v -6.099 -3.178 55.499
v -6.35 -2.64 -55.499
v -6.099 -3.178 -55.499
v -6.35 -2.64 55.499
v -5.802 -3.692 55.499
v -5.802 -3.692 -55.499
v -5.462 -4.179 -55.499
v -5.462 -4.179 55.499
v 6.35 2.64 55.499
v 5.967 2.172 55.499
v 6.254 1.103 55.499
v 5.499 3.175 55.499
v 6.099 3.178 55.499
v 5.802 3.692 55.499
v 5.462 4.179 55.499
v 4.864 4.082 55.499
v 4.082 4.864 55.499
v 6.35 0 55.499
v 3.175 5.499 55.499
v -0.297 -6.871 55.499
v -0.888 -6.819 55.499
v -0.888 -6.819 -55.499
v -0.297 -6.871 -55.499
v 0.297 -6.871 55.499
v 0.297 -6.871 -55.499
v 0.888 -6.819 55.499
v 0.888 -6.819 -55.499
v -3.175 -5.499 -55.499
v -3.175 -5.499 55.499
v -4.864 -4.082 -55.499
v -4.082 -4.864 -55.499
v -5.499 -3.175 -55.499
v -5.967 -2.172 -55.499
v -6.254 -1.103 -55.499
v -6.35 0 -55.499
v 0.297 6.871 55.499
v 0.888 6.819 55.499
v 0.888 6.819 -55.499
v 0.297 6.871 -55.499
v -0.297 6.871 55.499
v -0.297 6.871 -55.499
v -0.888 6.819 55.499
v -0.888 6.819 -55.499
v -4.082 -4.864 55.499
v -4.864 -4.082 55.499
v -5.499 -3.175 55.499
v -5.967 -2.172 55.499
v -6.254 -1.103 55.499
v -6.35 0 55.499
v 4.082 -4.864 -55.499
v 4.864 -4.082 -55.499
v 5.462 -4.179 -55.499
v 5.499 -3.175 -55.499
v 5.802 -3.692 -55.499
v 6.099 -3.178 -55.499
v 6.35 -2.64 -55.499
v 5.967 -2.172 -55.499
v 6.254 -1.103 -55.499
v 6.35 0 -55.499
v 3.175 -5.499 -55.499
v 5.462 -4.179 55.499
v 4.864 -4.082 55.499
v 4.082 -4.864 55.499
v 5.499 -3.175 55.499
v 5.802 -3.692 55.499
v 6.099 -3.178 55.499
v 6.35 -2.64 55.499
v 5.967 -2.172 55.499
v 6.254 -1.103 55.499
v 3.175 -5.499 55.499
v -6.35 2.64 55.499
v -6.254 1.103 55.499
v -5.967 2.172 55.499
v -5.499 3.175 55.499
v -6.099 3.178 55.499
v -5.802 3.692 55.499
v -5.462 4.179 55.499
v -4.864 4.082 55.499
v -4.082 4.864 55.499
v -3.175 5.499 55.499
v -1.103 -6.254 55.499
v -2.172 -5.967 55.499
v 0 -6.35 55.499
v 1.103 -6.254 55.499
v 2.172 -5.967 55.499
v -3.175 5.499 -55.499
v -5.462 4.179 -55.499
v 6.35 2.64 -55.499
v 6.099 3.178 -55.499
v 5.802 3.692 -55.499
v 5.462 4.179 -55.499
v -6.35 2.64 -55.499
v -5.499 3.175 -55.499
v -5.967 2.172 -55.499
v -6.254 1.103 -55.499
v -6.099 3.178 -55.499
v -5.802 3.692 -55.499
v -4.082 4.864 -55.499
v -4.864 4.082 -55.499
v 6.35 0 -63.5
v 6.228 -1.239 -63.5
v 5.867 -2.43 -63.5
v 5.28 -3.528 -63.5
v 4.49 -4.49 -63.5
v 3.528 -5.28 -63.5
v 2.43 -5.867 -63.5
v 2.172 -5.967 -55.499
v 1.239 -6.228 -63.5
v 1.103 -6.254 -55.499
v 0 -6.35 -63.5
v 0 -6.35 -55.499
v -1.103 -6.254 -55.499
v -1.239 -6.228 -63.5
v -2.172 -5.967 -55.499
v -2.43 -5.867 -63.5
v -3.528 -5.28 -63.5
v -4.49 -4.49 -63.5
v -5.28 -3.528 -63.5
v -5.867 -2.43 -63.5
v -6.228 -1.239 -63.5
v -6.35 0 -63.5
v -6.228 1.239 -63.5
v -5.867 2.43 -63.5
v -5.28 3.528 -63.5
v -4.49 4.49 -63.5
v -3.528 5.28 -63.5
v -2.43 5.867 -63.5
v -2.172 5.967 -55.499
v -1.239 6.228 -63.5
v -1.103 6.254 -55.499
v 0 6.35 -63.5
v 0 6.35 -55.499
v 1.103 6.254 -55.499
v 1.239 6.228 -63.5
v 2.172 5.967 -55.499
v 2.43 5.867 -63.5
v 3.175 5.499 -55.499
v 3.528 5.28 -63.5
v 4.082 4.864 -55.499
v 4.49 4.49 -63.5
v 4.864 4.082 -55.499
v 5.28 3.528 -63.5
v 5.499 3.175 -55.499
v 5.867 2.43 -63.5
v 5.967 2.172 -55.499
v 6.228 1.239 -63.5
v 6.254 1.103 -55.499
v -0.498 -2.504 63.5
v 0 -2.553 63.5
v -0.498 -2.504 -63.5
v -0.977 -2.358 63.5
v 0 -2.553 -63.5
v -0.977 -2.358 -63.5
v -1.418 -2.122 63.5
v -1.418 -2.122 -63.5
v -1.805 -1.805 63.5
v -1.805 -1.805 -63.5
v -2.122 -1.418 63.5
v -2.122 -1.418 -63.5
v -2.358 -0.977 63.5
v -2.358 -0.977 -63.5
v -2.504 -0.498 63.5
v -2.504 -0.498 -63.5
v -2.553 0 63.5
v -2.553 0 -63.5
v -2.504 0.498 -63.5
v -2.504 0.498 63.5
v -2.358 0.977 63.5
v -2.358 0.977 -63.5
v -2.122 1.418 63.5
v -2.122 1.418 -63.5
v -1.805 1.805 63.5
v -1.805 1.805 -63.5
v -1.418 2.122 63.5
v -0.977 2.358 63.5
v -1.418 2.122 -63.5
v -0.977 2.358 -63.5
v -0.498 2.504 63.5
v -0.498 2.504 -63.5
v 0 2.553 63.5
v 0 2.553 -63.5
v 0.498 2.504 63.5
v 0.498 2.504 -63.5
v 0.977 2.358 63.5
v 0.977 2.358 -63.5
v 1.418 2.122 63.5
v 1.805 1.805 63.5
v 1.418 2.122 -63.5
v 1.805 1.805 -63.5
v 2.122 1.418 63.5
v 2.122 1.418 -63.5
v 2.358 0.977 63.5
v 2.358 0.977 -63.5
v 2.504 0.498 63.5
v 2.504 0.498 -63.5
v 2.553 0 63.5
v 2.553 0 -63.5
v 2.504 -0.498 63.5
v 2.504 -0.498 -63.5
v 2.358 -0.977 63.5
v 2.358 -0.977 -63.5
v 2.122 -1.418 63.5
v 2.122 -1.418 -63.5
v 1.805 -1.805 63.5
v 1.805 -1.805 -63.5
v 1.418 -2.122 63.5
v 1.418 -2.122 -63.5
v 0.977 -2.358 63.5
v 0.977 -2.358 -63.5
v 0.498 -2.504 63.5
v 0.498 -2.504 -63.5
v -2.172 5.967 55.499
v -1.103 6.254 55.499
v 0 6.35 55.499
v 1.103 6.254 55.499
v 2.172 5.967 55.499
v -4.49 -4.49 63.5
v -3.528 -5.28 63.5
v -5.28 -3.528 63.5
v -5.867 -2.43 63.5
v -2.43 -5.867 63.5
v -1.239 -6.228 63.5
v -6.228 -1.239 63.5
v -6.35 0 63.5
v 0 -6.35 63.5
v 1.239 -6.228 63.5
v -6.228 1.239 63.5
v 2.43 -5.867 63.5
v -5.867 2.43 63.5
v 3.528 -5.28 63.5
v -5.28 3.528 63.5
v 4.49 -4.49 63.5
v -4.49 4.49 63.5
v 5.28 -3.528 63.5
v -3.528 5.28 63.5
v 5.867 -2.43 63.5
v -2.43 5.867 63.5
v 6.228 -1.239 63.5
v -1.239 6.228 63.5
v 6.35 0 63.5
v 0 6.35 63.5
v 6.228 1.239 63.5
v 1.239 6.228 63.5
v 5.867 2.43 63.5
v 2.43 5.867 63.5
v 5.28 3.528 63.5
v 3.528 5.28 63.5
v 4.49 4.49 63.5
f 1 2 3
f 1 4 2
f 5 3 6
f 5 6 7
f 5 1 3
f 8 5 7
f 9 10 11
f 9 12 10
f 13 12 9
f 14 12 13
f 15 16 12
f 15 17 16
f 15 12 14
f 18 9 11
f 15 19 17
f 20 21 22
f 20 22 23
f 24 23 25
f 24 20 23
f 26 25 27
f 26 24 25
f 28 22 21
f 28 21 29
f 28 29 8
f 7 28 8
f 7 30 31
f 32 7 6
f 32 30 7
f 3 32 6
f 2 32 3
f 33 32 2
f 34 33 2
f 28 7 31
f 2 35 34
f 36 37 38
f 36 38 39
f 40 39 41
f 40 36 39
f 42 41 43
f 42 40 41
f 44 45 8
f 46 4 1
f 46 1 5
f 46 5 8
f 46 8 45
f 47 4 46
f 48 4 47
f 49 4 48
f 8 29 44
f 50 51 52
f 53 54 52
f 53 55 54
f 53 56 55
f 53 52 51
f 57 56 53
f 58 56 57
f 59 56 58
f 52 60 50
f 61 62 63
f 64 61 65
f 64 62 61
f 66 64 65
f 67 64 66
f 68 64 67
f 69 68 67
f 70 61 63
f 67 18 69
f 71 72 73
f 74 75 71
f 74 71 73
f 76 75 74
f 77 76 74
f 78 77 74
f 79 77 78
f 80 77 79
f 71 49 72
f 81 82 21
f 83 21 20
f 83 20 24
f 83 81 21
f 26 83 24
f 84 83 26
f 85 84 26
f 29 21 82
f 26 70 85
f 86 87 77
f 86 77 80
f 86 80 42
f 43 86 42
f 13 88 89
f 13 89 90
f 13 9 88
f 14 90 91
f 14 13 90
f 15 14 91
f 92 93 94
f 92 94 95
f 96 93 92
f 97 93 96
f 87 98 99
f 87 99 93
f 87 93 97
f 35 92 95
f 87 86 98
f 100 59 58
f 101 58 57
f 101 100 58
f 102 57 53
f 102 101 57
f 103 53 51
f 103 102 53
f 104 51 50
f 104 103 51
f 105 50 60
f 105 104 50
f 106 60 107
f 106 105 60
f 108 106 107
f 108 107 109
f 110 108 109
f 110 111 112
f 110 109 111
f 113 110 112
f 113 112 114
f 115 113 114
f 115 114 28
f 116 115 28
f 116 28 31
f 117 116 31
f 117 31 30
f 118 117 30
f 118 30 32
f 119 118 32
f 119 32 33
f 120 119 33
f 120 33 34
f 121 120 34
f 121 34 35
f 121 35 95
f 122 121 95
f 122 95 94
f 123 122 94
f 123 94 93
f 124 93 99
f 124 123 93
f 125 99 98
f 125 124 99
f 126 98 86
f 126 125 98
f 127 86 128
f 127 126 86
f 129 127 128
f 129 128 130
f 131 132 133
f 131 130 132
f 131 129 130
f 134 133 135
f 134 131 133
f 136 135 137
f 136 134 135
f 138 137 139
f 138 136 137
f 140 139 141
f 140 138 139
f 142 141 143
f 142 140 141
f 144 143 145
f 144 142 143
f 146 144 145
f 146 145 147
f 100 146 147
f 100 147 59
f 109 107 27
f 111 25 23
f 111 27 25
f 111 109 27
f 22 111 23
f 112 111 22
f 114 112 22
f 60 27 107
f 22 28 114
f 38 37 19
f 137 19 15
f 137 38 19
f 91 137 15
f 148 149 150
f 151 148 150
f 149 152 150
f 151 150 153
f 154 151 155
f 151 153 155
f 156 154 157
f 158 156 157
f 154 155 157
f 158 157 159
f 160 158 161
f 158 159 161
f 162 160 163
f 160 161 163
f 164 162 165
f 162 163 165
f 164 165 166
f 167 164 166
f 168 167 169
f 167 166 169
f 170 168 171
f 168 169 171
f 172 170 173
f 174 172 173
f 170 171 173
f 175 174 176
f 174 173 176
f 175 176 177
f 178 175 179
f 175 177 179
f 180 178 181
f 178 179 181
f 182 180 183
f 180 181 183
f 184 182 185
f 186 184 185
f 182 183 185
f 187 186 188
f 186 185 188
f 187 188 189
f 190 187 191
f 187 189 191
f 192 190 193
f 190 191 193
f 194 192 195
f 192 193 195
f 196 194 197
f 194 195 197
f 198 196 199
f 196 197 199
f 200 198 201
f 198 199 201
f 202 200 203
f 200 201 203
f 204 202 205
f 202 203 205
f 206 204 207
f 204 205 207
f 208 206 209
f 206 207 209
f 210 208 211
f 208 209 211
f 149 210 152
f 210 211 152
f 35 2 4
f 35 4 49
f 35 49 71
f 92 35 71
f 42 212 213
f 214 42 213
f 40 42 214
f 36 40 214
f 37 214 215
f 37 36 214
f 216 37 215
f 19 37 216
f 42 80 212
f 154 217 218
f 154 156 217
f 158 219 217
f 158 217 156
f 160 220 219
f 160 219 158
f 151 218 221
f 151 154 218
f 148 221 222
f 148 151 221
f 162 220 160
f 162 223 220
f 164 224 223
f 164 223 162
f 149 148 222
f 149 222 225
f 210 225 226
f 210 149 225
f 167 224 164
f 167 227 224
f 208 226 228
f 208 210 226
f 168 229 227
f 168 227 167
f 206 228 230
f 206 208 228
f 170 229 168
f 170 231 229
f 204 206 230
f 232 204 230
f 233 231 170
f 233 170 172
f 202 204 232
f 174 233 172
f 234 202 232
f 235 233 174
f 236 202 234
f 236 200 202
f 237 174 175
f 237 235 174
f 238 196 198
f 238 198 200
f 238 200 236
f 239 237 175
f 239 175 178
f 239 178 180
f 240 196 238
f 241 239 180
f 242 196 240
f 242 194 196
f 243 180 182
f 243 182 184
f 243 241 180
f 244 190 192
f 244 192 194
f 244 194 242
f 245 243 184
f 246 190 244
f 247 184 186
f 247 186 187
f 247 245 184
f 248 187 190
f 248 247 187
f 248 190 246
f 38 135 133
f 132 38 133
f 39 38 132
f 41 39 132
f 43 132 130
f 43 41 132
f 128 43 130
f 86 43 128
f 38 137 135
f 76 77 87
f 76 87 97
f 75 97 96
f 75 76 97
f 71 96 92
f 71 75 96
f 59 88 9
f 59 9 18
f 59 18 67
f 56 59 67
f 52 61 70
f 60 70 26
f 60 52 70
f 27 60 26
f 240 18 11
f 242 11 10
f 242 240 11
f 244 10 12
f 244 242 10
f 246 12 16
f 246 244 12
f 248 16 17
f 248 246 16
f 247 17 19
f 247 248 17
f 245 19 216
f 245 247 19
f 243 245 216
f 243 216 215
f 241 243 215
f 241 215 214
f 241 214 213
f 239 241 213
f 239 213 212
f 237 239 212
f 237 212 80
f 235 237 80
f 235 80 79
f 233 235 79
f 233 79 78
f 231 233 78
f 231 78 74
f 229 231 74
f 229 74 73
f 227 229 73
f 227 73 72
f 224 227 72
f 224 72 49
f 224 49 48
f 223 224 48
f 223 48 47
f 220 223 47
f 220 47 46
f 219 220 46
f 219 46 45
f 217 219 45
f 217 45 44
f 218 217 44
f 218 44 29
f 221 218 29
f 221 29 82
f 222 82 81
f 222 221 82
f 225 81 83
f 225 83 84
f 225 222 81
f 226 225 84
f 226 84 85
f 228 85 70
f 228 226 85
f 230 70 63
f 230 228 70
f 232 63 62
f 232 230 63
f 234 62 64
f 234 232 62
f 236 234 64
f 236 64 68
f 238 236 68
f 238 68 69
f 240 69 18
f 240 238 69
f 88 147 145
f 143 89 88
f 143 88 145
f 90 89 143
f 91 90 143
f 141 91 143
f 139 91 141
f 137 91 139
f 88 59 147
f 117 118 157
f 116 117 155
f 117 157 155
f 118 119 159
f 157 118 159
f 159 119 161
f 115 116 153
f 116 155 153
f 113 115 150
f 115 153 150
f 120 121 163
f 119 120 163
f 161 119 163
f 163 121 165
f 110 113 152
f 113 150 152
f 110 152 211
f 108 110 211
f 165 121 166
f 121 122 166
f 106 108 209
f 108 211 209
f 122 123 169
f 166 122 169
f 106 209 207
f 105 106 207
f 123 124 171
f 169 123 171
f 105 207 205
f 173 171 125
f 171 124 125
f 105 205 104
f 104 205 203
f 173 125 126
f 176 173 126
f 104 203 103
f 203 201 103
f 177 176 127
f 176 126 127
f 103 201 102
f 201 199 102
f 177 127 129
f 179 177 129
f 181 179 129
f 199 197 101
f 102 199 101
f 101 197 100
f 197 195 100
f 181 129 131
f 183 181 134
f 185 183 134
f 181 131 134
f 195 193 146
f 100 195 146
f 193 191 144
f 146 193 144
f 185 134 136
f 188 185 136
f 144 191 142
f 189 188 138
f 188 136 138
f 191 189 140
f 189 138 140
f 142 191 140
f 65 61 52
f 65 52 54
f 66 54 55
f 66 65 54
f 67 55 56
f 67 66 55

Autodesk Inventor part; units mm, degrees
ref_plane "YZ Plane" through (0, 0, 0) normal (1, 0, 0) x (0, 1, 0)
ref_plane "XZ Plane" through (0, 0, 0) normal (0, 1, 0) x (-1, 0, 0)
ref_plane "XY Plane" through (0, 0, 0) normal (0, 0, 1) x (1, 0, 0)
sketch "Sketch1" plane through (0, 0, 0) normal (0, 0, 1) x (1, 0, 0)
  line L0 (-6.35, -3.6662) -> (-6.35, 3.6662)
  line L1 (-6.35, 3.6662) -> (0, 7.3323)
  line L2 (0, 7.3323) -> (6.35, 3.6662)
  line L3 (6.35, 3.6662) -> (6.35, -3.6662)
  line L4 (6.35, -3.6662) -> (0, -7.3323)
  line L5 (0, -7.3323) -> (-6.35, -3.6662)
  point P0 (0, 0)
  point P1 (0, 0)
  dimension "Size" = 12.7
extrude "Extrusion1" add sketch "Sketch1" along normal mid plane 127
sketch "Sketch3" plane through (0, 0, 63.5) normal (0, 0, 1) x (1, 0, 0)
  line L0 (-6.35, 3.6662) -> (0, 7.3323) construction
  line L1 (0, 7.3323) -> (6.35, 3.6662) construction
  line L2 (6.35, 3.6662) -> (6.35, -3.6662) construction
  line L3 (6.35, -3.6662) -> (0, -7.3323) construction
  line L4 (0, -7.3323) -> (-6.35, -3.6662) construction
  line L5 (-6.35, -3.6662) -> (-6.35, 3.6662) construction
  point P0 (0, 0)
hole "Hole1" at (0, 0, 63.5) direction (0, 0, -1) diameter 5.1054 end through all
sketch "Sketch4" plane through (0, 0, 63.5) normal (0, 0, 1) x (1, 0, 0)
  circle A0 centre (0, 0) radius 2.5527 construction
  line L0 (-6.35, 3.6662) -> (0, 7.3323) construction
  line L1 (0, 7.3323) -> (6.35, 3.6662) construction
  line L2 (6.35, 3.6662) -> (6.35, -3.6662) construction
  line L3 (6.35, -3.6662) -> (0, -7.3323) construction
  line L4 (0, -7.3323) -> (-6.35, -3.6662) construction
  line L5 (-6.35, -3.6662) -> (-6.35, 3.6662) construction
  circle A1 centre (0, 0) radius 6.8771
  circle A2 centre (0, 0) radius 8.89
  dimension "thunder" = 13.7541
  dimension "d16" = 17.78
extrude "Extrusion3" cut sketch "Sketch4" against normal through all
sketch "Sketch5" plane through (0, 0, 63.5) normal (0, 0, 1) x (1, 0, 0)
  arc A0 (5.4616, -4.1791) -> (6.35, -2.6403) centre (0, 0) ccw projected
  line L0 (6.35, -2.6403) -> (6.35, 2.6403) projected
  arc A1 (6.35, 2.6403) -> (5.4616, 4.1791) centre (0, 0) ccw projected
  line L1 (5.4616, 4.1791) -> (0.8884, 6.8194) projected
  arc A2 (0.8884, 6.8194) -> (-0.8884, 6.8194) centre (0, 0) ccw projected
  line L2 (-0.8884, 6.8194) -> (-5.4616, 4.1791) projected
  arc A3 (-5.4616, 4.1791) -> (-6.35, 2.6403) centre (0, 0) ccw projected
  line L3 (-6.35, 2.6403) -> (-6.35, -2.6403) projected
  arc A4 (-6.35, -2.6403) -> (-5.4616, -4.1791) centre (0, 0) ccw projected
  line L4 (-5.4616, -4.1791) -> (-0.8884, -6.8194) projected
  arc A5 (-0.8884, -6.8194) -> (0.8884, -6.8194) centre (0, 0) ccw projected
  line L5 (0.8884, -6.8194) -> (5.4616, -4.1791) projected
  circle A6 centre (0, 0) radius 2.5527 projected
  circle A7 centre (0, 0) radius 6.35
  point P0 (3.175, -5.4993)
  point P1 (-3.175, -5.4993)
  point P2 (-6.35, 0)
  point P3 (-3.175, 5.4993)
  point P4 (3.175, 5.4993)
  point P5 (6.35, 0)
  dimension "d19" = 12.7
extrude "Extrusion4" cut sketch "Sketch5" against normal blind 8.001 contours L5 A7 L0 A0 | L5 A5 L4 A7 | A7 L1 A1 L0 | L4 A4 L3 A7 | A7 L2 A2 L1 | L3 A3 L2 A7
mirror "Mirror2" about plane through (0, 0, 0) normal (0, 0, 1) of "Extrusion4"
equation "\"bearing\" = 25.4"
properties part number "GP3-002" material "Aluminum 6061"
